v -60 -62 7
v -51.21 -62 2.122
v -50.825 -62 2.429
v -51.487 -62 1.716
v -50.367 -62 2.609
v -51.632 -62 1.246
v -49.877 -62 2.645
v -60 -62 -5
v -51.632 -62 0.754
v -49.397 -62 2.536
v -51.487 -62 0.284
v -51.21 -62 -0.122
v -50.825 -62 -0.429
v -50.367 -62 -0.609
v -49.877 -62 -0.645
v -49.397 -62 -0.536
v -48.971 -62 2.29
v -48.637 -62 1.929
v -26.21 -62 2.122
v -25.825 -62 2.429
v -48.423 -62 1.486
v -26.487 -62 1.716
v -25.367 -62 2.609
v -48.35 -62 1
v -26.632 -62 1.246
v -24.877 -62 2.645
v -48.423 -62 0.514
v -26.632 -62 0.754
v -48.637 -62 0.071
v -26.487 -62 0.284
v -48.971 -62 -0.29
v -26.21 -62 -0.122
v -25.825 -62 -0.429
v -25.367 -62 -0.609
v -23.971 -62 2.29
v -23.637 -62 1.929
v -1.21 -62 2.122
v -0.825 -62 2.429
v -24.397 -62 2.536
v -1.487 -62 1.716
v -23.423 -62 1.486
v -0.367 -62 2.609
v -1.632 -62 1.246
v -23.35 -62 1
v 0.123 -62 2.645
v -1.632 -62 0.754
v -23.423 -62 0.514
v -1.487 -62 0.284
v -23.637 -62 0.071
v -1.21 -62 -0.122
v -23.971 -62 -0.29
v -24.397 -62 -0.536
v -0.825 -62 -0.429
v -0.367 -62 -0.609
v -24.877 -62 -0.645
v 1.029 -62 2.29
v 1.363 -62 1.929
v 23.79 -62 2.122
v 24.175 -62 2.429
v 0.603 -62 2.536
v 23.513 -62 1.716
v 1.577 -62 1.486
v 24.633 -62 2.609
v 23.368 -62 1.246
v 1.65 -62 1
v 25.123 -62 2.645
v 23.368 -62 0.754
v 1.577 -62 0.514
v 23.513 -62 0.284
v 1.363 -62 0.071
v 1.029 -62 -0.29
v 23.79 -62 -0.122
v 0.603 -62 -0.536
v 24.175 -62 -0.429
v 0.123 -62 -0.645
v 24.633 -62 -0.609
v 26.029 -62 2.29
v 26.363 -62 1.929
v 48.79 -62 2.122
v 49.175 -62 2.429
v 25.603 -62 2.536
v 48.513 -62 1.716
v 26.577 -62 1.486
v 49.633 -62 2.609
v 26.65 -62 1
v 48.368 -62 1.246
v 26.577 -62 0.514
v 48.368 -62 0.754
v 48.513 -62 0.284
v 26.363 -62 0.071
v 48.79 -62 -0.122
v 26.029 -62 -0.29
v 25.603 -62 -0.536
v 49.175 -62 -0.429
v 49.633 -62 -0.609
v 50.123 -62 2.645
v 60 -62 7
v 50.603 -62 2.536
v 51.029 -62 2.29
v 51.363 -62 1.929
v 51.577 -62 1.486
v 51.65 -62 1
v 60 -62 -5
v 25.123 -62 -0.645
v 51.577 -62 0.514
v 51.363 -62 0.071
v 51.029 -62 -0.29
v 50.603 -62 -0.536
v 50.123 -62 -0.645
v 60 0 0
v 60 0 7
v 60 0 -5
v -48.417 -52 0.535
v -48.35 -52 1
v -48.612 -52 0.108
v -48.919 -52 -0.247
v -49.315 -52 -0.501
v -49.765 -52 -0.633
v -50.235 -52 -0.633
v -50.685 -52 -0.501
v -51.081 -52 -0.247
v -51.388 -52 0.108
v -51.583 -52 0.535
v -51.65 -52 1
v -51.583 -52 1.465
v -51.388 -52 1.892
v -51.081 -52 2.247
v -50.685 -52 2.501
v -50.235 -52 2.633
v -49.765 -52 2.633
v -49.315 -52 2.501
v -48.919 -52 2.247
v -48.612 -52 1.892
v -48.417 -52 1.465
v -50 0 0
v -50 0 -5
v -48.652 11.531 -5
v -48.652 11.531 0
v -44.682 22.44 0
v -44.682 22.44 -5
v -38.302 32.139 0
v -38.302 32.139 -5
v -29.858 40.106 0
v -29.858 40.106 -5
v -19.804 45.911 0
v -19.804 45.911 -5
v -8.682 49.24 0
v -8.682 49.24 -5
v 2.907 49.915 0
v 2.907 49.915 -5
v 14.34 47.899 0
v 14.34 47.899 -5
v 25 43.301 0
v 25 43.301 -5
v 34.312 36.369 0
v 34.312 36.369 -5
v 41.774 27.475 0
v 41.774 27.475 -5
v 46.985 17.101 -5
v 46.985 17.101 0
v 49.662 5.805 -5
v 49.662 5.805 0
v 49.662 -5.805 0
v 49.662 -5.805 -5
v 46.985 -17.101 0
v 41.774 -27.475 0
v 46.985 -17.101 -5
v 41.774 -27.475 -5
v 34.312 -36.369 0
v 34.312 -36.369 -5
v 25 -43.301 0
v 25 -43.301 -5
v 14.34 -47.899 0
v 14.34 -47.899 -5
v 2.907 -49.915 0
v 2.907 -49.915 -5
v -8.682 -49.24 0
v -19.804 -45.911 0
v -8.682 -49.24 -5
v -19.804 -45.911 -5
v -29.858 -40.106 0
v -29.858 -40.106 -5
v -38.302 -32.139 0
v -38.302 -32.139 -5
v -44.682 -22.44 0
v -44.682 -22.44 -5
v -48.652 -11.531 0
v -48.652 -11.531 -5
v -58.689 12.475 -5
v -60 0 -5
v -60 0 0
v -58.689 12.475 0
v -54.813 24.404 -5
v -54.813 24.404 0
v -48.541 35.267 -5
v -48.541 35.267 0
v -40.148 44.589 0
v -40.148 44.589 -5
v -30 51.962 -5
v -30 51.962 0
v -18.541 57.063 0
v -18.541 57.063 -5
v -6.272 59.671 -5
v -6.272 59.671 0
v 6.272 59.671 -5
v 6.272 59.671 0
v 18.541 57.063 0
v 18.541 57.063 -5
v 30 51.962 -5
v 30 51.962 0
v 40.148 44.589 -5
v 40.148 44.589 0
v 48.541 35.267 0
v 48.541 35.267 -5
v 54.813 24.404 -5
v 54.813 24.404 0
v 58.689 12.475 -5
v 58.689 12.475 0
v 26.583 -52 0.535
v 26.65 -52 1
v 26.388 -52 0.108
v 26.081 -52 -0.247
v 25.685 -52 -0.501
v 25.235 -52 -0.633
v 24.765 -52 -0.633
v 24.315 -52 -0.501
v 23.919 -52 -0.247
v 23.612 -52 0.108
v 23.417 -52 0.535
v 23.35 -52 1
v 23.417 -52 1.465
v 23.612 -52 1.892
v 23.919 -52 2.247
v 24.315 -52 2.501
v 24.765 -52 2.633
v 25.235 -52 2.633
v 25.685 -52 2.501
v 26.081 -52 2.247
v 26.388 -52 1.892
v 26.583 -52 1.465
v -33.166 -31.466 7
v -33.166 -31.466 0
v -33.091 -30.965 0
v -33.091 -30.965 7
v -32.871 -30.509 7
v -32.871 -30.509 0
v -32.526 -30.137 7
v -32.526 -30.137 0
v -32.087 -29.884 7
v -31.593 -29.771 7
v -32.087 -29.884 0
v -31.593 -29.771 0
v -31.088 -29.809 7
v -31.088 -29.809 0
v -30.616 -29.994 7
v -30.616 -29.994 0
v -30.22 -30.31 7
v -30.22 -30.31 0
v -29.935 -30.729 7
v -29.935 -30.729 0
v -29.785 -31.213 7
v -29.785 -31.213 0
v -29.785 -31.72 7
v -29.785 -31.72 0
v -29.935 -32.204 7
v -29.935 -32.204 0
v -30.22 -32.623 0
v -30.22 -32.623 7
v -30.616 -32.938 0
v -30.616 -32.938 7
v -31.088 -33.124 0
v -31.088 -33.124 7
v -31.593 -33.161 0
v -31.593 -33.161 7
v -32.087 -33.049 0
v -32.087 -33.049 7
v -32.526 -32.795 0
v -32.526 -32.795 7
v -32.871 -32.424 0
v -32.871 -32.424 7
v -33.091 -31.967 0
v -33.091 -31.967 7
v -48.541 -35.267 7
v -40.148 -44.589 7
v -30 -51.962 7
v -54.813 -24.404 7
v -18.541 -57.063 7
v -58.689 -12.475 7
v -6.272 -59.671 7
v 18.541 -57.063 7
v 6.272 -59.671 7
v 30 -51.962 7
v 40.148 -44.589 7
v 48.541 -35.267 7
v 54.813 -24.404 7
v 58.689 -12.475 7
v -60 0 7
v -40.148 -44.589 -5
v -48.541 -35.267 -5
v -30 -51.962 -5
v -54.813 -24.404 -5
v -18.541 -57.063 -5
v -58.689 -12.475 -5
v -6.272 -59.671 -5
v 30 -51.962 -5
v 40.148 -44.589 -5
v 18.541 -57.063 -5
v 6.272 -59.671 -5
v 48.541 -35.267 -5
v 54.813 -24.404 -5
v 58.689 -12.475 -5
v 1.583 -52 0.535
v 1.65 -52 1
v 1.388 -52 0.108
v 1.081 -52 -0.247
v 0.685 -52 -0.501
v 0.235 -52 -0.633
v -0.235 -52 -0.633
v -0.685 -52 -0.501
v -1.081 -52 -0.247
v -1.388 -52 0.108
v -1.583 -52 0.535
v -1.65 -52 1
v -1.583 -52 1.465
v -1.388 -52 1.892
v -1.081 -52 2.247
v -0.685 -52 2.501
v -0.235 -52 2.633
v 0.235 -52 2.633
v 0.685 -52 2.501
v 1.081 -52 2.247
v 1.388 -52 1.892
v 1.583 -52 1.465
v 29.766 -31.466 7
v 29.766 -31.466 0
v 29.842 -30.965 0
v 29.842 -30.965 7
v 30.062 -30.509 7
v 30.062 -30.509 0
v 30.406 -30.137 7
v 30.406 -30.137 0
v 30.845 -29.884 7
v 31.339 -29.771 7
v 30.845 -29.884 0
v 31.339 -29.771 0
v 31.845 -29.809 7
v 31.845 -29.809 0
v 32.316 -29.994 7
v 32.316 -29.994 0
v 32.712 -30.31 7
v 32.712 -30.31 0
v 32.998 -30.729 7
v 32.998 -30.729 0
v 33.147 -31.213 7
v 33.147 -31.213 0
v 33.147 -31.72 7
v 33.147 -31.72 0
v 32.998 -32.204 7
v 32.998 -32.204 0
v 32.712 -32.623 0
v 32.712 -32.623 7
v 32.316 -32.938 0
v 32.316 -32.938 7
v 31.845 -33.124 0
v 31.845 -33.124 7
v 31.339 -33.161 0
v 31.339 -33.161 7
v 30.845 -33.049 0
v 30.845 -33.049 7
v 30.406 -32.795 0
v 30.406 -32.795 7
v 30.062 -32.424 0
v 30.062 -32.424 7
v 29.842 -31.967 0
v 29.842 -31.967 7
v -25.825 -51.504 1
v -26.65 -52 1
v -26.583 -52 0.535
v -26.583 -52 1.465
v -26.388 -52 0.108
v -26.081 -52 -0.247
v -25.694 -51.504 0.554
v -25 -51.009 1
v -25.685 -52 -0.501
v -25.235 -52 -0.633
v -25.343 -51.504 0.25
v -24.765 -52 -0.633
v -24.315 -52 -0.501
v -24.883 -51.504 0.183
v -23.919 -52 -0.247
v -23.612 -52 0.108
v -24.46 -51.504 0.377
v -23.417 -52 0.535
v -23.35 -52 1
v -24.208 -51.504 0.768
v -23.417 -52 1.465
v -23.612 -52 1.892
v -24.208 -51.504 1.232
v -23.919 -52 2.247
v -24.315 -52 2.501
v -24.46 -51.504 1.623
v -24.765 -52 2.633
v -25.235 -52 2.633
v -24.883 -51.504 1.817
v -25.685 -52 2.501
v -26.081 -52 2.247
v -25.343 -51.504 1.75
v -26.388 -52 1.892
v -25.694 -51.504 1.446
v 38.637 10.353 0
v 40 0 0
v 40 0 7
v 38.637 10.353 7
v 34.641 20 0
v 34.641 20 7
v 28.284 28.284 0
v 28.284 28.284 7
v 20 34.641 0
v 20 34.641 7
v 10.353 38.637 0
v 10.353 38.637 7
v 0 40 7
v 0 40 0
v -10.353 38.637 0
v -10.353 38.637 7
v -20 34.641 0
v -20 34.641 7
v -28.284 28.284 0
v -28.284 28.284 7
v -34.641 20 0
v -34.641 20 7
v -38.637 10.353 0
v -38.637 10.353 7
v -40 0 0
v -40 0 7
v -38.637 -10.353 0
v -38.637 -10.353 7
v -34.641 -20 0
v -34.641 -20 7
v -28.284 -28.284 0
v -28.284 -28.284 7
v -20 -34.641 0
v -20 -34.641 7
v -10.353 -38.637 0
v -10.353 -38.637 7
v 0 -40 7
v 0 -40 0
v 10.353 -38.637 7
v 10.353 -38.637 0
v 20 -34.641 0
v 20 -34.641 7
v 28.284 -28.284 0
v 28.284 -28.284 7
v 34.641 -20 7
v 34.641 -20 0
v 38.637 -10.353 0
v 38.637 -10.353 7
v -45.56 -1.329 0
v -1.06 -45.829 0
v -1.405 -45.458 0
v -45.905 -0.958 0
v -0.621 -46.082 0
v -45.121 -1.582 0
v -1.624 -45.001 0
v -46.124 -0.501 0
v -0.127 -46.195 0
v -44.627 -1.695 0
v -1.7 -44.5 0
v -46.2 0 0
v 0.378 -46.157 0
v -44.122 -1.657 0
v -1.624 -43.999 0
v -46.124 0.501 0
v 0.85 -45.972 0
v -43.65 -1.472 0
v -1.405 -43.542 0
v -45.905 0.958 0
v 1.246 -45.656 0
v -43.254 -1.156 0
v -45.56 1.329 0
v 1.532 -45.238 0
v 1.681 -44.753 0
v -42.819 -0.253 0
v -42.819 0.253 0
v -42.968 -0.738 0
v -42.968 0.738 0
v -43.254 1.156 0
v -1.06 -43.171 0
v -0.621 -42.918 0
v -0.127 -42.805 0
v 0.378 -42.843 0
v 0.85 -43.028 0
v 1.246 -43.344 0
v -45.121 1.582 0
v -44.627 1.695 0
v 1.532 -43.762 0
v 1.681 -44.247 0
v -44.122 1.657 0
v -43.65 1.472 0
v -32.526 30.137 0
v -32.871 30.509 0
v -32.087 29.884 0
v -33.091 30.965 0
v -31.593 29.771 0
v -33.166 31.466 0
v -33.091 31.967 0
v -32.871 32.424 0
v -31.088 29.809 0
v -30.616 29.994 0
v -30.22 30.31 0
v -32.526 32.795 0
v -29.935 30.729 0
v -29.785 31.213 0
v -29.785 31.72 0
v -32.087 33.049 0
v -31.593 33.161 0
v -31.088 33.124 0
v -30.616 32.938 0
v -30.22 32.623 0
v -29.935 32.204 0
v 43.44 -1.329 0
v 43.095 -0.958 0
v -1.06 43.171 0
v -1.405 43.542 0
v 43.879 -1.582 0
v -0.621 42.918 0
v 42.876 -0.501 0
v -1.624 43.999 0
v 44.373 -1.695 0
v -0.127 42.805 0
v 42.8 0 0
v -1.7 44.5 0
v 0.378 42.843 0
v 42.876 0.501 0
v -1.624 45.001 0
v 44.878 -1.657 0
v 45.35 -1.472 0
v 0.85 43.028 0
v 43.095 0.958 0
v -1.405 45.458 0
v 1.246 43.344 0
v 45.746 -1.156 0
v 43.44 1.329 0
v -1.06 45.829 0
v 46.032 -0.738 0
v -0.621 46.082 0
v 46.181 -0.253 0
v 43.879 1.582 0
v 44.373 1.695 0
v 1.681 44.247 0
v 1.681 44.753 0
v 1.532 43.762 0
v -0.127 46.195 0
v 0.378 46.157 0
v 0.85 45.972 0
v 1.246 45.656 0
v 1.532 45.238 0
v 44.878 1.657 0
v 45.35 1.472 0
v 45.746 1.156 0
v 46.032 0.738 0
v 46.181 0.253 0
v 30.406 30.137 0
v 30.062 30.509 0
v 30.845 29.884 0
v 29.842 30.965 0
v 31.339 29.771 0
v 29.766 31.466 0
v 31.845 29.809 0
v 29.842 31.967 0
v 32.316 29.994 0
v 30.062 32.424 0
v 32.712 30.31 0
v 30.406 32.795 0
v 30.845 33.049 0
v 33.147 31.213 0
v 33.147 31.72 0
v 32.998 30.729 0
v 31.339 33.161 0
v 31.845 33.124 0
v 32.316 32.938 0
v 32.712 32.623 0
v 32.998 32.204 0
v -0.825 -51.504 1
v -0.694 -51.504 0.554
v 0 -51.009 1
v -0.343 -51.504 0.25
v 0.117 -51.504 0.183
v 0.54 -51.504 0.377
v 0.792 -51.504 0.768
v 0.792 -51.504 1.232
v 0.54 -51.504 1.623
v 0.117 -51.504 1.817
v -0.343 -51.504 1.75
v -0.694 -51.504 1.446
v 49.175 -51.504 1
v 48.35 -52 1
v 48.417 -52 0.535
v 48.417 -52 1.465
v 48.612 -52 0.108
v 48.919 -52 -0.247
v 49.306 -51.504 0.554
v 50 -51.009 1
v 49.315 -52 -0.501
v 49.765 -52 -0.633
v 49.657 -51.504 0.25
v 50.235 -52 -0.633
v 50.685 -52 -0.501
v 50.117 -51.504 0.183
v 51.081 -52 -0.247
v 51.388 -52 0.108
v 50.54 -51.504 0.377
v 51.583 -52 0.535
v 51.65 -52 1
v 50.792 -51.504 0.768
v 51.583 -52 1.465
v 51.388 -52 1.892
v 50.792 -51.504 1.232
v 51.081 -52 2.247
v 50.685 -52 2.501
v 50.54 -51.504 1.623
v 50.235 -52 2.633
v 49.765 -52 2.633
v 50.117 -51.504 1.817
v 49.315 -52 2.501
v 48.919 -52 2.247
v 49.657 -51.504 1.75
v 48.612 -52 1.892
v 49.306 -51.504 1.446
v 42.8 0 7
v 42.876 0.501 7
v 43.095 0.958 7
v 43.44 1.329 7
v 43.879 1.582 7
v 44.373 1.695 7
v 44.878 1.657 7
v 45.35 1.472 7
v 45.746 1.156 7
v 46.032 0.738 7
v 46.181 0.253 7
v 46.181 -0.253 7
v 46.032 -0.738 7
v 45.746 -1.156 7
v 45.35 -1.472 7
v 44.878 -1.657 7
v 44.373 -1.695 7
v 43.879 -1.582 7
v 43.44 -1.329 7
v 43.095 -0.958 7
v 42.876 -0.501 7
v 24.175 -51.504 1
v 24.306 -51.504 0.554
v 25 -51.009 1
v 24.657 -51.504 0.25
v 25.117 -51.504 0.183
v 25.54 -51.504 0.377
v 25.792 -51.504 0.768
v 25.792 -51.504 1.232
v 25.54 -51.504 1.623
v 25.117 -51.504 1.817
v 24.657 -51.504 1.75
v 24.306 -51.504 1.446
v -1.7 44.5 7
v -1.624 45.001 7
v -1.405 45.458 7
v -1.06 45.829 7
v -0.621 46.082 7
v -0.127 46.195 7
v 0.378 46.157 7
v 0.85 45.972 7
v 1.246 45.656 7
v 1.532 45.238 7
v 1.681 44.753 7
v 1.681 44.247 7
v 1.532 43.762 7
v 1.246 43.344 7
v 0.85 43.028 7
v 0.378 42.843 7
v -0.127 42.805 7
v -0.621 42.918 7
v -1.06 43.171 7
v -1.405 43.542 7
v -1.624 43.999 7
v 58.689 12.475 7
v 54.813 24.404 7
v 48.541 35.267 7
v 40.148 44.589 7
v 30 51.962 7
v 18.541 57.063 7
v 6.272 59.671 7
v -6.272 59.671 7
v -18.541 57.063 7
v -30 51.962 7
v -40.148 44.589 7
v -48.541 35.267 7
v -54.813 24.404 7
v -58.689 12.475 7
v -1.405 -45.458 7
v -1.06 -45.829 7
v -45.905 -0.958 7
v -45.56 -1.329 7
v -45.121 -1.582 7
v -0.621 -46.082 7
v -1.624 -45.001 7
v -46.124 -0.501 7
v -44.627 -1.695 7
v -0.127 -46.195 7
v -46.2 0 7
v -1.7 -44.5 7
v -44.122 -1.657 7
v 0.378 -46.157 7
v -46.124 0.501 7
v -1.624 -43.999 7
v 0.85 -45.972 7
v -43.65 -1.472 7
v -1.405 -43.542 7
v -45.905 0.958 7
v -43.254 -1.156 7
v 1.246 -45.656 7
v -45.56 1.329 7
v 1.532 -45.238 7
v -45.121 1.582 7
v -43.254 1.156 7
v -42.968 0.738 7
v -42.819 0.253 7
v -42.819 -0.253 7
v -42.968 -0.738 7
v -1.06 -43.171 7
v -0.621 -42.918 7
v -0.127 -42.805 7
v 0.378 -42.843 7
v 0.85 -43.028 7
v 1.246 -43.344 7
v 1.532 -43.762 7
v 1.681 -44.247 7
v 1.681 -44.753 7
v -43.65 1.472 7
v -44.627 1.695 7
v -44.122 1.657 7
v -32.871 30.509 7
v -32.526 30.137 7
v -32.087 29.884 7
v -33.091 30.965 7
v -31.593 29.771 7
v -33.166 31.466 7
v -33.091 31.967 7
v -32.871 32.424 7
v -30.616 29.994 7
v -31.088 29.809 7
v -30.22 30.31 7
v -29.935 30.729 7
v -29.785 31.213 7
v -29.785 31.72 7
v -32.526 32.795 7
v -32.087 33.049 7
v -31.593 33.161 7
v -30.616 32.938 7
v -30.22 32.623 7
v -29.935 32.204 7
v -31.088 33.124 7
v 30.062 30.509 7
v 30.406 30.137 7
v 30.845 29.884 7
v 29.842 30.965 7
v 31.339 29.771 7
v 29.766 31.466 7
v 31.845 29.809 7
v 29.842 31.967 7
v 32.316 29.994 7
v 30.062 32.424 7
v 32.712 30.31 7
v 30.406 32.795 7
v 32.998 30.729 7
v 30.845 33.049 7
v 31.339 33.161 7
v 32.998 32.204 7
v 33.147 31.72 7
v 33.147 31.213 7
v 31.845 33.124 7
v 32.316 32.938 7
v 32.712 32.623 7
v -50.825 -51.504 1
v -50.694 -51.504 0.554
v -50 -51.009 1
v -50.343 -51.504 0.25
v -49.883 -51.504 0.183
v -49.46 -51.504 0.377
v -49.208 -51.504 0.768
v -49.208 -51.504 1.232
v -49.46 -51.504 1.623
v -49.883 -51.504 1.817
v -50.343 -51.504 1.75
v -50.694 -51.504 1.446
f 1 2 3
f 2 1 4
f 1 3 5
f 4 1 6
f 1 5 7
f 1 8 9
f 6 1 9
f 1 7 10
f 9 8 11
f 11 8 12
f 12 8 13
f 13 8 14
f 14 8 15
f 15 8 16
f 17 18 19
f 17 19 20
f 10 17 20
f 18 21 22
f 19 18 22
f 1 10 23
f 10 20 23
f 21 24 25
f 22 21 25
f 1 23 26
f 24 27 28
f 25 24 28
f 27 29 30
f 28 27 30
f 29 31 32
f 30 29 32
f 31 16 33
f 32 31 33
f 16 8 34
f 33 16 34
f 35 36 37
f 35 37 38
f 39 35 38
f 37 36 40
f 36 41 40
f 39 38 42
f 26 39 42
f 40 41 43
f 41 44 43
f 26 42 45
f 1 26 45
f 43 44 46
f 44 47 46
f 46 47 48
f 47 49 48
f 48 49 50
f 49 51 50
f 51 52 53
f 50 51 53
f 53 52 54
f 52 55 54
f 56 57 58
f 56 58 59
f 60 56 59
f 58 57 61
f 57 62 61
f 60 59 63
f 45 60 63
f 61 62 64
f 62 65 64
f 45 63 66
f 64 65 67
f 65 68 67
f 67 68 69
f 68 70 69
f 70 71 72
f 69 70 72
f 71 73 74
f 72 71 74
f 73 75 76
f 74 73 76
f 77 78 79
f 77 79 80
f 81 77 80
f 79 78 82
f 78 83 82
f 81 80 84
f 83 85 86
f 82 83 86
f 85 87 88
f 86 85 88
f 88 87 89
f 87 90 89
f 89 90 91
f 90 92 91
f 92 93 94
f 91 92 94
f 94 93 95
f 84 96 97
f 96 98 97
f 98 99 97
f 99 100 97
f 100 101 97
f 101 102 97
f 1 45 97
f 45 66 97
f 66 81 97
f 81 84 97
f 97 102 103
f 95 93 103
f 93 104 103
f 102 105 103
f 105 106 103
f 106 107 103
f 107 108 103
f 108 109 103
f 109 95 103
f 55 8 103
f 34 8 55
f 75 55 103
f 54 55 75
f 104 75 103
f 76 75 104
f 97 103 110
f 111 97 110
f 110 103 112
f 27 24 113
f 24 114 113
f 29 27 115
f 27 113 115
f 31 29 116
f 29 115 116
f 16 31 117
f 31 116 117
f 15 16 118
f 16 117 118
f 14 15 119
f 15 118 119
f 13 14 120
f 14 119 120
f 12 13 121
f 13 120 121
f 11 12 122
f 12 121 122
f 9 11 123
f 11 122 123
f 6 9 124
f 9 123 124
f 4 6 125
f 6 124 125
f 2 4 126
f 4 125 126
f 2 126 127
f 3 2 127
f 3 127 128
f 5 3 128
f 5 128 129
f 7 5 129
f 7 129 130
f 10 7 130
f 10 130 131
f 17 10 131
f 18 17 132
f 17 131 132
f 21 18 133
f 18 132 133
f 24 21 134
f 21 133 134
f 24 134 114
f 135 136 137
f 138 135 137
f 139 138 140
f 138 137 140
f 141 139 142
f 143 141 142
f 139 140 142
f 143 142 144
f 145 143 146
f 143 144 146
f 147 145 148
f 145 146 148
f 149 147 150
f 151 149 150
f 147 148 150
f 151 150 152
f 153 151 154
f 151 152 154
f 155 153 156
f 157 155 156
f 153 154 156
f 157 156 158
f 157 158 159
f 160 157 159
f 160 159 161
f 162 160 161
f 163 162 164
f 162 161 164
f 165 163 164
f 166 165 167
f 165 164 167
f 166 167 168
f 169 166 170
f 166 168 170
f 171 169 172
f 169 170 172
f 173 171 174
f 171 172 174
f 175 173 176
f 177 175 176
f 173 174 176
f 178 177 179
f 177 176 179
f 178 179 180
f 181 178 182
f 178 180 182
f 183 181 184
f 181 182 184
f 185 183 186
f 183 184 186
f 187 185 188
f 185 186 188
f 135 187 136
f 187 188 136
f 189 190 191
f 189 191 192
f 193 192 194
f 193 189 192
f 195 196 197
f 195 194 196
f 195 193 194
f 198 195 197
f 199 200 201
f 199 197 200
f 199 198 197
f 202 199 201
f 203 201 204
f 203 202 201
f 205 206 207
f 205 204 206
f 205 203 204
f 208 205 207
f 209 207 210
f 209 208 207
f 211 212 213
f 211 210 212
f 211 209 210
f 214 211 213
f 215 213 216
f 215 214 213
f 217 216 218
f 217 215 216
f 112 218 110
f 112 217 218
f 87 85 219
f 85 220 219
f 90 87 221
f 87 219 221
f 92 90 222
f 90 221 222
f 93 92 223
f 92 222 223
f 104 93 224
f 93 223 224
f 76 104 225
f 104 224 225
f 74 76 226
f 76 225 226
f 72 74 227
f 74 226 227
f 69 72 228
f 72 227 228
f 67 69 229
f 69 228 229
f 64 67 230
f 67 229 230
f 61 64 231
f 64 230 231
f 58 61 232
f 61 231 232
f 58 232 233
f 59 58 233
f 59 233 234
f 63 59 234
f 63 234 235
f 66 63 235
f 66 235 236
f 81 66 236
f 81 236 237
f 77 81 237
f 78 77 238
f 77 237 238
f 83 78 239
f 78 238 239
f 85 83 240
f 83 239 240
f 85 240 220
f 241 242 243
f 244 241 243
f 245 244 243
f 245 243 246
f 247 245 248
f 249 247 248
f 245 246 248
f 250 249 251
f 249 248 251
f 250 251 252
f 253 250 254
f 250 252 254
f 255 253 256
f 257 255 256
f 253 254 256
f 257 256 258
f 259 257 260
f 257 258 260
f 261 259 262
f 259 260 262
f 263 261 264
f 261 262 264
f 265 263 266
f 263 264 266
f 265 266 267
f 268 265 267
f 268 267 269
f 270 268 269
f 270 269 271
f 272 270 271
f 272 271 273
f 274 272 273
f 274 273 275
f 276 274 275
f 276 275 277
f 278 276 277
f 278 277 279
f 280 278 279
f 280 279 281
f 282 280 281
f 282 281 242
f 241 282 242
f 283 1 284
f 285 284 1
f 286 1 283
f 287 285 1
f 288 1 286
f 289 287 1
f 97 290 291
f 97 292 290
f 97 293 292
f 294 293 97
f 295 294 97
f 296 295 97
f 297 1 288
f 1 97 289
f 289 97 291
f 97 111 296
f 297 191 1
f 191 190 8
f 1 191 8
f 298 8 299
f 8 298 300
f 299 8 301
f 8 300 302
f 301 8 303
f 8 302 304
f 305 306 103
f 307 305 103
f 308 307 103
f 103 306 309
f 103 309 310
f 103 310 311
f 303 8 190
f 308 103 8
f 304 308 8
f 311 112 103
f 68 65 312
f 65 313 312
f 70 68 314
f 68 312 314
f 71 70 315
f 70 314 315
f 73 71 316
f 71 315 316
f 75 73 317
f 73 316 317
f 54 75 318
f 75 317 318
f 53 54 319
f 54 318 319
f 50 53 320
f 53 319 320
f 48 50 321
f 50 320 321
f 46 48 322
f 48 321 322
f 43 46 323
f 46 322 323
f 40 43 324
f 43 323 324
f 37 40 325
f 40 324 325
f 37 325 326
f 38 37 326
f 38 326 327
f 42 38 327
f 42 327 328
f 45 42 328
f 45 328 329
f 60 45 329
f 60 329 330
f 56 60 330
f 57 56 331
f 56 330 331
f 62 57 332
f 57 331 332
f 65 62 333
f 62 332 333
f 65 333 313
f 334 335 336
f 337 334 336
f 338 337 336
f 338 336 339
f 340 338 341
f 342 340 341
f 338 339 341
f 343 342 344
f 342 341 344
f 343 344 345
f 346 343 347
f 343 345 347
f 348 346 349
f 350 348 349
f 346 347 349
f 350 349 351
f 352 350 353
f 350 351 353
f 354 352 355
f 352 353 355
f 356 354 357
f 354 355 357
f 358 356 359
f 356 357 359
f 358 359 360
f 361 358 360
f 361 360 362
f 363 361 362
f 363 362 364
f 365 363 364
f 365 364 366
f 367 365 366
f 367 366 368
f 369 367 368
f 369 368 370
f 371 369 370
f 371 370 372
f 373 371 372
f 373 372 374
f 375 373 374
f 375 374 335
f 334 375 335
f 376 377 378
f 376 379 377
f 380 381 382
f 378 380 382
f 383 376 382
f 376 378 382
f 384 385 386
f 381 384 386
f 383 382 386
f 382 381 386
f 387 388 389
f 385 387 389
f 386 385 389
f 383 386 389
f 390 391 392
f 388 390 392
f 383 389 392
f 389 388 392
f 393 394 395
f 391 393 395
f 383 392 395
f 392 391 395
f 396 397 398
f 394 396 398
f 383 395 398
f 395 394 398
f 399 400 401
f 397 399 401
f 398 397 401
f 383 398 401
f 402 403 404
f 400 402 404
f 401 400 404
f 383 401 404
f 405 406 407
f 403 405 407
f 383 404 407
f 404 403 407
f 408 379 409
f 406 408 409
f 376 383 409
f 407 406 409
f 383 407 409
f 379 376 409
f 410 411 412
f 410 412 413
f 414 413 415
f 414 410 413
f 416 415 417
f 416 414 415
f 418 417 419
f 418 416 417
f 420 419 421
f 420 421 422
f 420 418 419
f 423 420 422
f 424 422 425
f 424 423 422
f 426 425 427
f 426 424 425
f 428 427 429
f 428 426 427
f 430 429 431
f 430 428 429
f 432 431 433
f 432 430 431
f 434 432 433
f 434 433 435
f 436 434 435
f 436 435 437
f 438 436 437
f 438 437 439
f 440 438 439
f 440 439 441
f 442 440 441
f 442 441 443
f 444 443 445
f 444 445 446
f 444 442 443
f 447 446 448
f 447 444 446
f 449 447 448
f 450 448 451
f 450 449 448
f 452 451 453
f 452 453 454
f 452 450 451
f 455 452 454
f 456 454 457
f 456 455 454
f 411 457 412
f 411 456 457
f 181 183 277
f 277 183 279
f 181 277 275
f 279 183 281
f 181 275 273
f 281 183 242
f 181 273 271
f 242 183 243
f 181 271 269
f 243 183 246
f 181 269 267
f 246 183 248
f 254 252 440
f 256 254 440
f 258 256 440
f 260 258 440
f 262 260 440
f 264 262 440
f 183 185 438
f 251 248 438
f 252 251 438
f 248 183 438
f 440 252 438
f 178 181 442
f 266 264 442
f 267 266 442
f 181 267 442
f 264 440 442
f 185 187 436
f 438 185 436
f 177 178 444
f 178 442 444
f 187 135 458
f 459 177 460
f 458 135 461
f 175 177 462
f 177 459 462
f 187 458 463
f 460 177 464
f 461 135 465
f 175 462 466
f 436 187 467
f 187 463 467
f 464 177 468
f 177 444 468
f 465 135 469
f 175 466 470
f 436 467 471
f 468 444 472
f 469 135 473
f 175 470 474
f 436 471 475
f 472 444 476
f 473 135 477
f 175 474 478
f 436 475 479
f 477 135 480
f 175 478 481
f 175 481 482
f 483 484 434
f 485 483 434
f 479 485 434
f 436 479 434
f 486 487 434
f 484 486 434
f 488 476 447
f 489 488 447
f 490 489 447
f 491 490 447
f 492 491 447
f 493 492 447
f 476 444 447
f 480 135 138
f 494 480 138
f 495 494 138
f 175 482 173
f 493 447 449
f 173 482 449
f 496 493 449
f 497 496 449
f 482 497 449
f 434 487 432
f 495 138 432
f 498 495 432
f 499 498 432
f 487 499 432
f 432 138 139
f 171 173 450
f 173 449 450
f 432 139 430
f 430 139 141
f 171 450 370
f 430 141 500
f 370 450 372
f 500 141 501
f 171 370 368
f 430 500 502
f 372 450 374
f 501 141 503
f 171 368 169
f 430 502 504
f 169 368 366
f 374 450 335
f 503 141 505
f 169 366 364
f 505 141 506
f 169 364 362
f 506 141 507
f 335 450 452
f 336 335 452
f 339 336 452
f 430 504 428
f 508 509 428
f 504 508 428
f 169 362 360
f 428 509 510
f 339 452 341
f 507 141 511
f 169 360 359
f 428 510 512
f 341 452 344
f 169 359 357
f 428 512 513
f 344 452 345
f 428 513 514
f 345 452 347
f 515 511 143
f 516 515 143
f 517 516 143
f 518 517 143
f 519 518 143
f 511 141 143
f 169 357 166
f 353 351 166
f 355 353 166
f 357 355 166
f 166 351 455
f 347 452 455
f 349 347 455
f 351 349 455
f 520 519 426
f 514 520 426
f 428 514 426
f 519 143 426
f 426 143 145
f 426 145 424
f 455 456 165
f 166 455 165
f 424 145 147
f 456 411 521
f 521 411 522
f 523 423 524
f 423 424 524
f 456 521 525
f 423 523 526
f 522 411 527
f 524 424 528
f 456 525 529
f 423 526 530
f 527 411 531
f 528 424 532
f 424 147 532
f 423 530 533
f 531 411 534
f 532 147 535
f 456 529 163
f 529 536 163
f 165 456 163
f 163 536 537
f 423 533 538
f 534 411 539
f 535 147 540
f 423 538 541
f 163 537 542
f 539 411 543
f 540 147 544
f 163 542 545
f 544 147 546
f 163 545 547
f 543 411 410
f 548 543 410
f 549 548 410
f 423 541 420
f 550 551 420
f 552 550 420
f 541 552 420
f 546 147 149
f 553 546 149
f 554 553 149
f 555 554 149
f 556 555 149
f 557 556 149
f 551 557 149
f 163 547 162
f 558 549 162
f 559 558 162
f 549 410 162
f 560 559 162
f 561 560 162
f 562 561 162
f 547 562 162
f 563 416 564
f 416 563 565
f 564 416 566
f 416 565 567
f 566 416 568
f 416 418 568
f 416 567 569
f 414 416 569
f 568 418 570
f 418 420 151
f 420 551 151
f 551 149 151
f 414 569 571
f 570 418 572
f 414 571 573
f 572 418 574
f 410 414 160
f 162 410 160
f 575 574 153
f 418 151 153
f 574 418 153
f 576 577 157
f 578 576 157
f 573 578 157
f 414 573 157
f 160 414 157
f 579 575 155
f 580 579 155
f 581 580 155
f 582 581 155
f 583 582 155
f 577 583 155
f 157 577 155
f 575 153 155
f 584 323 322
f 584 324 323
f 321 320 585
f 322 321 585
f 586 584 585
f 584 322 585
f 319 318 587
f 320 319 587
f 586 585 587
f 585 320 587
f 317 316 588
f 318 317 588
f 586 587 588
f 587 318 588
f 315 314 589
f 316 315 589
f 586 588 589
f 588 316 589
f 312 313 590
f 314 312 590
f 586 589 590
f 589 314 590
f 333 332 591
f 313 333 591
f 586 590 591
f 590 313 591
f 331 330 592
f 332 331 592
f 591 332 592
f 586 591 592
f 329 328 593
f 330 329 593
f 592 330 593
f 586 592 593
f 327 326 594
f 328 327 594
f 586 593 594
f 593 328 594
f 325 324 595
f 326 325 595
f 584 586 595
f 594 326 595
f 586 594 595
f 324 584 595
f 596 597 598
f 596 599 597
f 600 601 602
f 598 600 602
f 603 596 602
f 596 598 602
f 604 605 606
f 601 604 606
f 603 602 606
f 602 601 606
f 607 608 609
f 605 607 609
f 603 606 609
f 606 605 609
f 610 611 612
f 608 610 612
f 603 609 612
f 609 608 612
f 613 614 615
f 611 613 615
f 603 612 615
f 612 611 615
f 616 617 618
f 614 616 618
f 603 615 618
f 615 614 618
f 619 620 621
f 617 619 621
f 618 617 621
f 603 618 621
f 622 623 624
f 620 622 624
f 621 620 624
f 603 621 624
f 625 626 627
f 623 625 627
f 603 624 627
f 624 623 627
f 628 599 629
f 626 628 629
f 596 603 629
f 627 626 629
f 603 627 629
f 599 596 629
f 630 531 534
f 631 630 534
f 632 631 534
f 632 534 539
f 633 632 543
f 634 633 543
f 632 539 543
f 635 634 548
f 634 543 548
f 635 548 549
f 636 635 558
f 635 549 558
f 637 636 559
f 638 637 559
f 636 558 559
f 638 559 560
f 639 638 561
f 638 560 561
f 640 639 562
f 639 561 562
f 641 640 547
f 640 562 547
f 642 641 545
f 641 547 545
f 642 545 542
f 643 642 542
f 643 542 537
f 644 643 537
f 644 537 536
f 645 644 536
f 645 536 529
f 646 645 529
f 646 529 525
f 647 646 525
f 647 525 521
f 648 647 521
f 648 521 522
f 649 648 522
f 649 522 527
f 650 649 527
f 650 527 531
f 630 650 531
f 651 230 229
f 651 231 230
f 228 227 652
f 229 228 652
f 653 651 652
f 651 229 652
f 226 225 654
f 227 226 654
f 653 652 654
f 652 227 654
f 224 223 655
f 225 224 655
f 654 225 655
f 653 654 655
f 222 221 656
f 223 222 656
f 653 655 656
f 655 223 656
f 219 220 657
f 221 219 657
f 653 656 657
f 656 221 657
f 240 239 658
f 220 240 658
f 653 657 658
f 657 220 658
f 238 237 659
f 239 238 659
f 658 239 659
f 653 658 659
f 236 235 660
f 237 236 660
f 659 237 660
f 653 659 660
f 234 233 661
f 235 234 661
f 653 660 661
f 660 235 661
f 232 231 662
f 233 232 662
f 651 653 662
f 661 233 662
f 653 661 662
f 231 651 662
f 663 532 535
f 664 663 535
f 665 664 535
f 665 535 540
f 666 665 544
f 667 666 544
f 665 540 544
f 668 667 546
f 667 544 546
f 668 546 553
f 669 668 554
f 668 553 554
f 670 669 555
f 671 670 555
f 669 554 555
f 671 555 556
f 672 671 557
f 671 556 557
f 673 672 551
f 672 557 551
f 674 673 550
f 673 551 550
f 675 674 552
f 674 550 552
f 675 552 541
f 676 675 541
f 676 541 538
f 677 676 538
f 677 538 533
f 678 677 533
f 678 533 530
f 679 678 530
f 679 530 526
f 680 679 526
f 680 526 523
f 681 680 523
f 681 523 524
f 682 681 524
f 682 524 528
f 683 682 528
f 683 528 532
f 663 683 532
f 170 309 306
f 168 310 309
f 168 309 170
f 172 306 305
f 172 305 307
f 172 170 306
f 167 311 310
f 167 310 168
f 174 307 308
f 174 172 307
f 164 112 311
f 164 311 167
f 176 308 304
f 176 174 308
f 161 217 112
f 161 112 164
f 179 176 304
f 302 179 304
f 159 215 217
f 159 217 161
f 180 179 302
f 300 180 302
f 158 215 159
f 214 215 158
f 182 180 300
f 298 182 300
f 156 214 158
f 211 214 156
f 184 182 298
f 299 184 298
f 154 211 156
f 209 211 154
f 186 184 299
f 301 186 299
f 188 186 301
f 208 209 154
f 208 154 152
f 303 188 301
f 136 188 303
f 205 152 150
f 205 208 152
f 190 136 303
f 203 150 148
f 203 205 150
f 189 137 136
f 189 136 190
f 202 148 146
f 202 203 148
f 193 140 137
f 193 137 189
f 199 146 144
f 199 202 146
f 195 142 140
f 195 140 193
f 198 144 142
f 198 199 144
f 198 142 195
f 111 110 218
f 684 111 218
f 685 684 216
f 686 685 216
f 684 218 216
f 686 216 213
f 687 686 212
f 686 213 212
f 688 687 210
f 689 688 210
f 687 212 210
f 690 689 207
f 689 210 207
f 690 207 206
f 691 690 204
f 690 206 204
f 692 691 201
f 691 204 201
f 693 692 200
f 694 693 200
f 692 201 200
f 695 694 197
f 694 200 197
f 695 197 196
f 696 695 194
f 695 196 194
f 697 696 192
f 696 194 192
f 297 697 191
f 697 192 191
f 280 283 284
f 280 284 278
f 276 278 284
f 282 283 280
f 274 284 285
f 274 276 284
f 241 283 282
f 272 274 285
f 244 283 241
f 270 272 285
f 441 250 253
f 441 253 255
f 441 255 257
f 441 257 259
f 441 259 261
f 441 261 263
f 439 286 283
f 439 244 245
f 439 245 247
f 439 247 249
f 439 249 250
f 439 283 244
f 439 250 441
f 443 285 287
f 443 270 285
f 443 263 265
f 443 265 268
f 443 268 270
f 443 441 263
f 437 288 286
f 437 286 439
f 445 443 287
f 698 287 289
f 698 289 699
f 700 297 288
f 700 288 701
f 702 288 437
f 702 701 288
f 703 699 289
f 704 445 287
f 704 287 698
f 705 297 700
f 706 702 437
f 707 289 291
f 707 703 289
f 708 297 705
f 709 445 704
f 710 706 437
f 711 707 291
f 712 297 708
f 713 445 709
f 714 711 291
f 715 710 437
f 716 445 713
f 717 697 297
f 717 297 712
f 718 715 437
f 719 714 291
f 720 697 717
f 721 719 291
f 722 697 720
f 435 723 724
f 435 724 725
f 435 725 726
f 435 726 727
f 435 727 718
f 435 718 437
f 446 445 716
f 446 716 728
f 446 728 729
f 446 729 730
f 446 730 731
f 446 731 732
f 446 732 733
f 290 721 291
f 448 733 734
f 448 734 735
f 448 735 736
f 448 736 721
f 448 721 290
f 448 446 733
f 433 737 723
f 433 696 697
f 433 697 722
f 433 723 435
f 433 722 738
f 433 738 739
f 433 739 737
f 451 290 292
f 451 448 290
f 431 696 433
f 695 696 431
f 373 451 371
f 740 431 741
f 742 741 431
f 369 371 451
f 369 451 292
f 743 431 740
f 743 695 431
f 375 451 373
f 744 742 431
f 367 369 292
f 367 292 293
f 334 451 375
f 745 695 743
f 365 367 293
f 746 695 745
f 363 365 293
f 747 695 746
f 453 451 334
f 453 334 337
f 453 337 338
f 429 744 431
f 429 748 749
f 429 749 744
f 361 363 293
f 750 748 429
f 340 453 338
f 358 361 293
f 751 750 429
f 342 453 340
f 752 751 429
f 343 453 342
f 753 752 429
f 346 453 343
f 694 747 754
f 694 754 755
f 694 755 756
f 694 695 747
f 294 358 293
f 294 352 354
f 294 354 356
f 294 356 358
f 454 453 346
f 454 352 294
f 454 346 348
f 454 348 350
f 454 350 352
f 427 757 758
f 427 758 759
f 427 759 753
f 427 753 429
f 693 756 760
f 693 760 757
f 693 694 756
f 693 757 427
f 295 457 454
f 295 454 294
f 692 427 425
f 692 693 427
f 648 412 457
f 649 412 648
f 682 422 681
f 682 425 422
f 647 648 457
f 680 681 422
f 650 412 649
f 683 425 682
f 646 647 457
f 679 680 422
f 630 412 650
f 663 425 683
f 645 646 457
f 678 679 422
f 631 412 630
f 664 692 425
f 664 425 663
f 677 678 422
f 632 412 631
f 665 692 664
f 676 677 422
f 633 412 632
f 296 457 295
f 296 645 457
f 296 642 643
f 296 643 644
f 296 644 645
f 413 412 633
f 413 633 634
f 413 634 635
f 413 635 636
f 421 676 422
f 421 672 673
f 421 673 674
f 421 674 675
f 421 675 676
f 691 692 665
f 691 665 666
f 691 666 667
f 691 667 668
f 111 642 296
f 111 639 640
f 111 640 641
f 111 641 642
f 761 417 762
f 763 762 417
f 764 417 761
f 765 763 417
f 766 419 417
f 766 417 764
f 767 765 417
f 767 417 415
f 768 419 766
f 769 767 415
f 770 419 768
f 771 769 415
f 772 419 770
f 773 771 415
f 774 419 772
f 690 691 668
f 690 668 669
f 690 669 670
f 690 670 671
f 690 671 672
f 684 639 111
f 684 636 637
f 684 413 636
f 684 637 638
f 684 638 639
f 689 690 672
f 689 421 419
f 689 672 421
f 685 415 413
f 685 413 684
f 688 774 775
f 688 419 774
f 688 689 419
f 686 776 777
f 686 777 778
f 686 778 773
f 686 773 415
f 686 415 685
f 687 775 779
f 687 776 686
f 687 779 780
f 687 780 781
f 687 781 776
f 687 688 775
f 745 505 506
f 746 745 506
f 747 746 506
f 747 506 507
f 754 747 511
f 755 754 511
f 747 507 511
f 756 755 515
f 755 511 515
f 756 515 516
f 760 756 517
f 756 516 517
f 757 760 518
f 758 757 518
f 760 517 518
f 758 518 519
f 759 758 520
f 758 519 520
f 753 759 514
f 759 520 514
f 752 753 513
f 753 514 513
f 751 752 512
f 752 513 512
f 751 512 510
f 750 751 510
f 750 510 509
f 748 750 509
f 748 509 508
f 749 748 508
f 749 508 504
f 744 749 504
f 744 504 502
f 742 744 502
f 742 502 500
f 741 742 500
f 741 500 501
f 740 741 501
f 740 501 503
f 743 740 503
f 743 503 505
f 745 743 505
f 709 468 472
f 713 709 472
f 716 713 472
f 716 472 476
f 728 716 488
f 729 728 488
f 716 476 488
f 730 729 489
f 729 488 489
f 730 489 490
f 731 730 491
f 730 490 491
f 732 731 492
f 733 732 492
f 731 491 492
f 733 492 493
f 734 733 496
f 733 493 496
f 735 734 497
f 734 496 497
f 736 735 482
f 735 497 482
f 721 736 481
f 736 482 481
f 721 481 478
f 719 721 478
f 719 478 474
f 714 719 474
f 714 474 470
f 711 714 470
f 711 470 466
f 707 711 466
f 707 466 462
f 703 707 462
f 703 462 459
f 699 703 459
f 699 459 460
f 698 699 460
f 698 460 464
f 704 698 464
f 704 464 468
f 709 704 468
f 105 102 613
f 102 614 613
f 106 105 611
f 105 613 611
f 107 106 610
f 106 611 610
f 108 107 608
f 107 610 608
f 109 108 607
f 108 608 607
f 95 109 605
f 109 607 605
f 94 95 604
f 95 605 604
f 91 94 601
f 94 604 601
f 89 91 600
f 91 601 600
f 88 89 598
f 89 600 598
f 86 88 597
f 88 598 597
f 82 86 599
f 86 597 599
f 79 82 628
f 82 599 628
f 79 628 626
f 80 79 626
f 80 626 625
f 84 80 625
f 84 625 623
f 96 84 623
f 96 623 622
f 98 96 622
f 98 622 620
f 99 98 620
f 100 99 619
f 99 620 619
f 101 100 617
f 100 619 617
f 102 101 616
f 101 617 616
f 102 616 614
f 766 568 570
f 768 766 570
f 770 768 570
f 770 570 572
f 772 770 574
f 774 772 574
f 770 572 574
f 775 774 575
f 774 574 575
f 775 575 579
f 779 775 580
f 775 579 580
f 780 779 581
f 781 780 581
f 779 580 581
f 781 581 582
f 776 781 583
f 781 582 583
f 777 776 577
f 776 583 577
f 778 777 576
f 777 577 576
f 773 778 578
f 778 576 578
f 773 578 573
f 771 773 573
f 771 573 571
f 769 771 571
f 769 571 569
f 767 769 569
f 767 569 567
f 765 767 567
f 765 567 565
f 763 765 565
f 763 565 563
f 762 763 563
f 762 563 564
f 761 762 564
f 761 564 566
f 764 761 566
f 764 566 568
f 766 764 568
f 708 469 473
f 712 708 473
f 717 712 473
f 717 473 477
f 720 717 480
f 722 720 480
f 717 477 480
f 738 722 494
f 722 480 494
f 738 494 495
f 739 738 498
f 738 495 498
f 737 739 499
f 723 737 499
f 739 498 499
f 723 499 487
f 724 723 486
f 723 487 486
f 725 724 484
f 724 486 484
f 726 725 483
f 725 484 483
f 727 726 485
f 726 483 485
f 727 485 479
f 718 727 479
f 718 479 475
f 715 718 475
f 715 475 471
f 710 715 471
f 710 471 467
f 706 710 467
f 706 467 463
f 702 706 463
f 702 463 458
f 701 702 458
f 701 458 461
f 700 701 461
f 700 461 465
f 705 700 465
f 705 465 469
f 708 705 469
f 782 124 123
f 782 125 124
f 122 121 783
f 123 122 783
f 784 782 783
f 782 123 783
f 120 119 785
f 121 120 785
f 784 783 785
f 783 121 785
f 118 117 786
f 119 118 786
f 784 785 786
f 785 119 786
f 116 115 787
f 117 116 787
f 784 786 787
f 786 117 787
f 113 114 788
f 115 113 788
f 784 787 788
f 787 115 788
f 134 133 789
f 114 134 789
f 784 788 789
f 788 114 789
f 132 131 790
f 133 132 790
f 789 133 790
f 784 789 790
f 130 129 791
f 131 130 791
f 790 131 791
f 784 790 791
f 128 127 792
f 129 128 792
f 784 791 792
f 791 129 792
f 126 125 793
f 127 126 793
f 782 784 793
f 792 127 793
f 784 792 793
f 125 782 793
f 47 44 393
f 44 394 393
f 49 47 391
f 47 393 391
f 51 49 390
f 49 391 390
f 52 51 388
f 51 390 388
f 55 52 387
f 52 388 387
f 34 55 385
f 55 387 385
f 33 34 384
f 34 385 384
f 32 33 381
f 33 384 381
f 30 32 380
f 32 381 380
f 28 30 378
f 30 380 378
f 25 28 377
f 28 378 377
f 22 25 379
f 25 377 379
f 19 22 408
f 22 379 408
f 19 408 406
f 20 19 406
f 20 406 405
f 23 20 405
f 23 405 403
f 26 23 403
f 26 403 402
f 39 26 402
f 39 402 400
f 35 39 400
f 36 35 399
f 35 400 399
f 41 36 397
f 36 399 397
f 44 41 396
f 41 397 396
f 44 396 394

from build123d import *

# Parameters (mm, degrees)
SKETCH1_R                   = 60
SKETCH1_R_2                 = 40
BOSS_EXTRUDE1_DEPTH         = 7
M3_CLEARANCE_HOLE1_D        = 3.4
BOSS_EXTRUDE3_START         = 5
SKETCH4_R                   = 60
SKETCH4_R_2                 = 50
BOSS_EXTRUDE3_DEPTH         = 5
BOSS_EXTRUDE4_START         = -12
BOSS_EXTRUDE4_DEPTH         = 12
TAP_DRILL_FOR_M4_TAP1_D     = 3.3
TAP_DRILL_FOR_M4_TAP1_DEPTH = 10
TAP_DRILL_FOR_M4_TAP1_TIP   = 0.991420021


with BuildPart() as part:
    # Sketch1 → Boss-Extrude1 (new body)
    with BuildSketch(Plane.XY):
        Circle(SKETCH1_R)
        Circle(SKETCH1_R_2, mode=Mode.SUBTRACT)
    extrude(amount=BOSS_EXTRUDE1_DEPTH)

    # M3 Clearance Hole1 (through all)
    with Locations(Plane.XY.offset(7)):
        with Locations((-31.466251763, 31.466251763), (0, 44.5), (31.466251763, 31.466251763), (44.5, 0), (31.466251763, -31.466251763), (0, -44.5), (-31.466251763, -31.466251763), (-44.5, 0)):
            Hole(M3_CLEARANCE_HOLE1_D / 2)

    # Sketch4 → Boss-Extrude3 (add)
    with BuildSketch(Plane(origin=(0, 0, 0), x_dir=(-1, 0, 0), z_dir=(0, 0, -1)).offset(BOSS_EXTRUDE3_START)):
        Circle(SKETCH4_R)
        Circle(SKETCH4_R_2, mode=Mode.SUBTRACT)
    extrude(amount=-BOSS_EXTRUDE3_DEPTH)

    # Sketch5 → Boss-Extrude4 (add)
    with BuildSketch(Plane.XY.offset(7).offset(BOSS_EXTRUDE4_START)):
        with BuildLine():
            Line((-60, 0), (-60, -62))
            Line((-60, -62), (60, -62))
            Line((60, -62), (60, 0))
            ThreePointArc((60, 0), (0, -60), (-60, 0))
        make_face()
    extrude(amount=BOSS_EXTRUDE4_DEPTH)

    # Tap Drill for M4 Tap1
    with Locations(Plane(origin=(0, -62, 0), x_dir=(-1, 0, 0), z_dir=(0, -1, 0))):
        with Locations((-50, -1), (0, -1), (25, -1), (50, -1), (-25, -1)):
            Hole(TAP_DRILL_FOR_M4_TAP1_D / 2, depth=TAP_DRILL_FOR_M4_TAP1_DEPTH)
            with Locations((0, 0, -(TAP_DRILL_FOR_M4_TAP1_DEPTH + TAP_DRILL_FOR_M4_TAP1_TIP / 2))):  # 118° drill point
                Cone(0, TAP_DRILL_FOR_M4_TAP1_D / 2, TAP_DRILL_FOR_M4_TAP1_TIP, mode=Mode.SUBTRACT)


solid = part.part
